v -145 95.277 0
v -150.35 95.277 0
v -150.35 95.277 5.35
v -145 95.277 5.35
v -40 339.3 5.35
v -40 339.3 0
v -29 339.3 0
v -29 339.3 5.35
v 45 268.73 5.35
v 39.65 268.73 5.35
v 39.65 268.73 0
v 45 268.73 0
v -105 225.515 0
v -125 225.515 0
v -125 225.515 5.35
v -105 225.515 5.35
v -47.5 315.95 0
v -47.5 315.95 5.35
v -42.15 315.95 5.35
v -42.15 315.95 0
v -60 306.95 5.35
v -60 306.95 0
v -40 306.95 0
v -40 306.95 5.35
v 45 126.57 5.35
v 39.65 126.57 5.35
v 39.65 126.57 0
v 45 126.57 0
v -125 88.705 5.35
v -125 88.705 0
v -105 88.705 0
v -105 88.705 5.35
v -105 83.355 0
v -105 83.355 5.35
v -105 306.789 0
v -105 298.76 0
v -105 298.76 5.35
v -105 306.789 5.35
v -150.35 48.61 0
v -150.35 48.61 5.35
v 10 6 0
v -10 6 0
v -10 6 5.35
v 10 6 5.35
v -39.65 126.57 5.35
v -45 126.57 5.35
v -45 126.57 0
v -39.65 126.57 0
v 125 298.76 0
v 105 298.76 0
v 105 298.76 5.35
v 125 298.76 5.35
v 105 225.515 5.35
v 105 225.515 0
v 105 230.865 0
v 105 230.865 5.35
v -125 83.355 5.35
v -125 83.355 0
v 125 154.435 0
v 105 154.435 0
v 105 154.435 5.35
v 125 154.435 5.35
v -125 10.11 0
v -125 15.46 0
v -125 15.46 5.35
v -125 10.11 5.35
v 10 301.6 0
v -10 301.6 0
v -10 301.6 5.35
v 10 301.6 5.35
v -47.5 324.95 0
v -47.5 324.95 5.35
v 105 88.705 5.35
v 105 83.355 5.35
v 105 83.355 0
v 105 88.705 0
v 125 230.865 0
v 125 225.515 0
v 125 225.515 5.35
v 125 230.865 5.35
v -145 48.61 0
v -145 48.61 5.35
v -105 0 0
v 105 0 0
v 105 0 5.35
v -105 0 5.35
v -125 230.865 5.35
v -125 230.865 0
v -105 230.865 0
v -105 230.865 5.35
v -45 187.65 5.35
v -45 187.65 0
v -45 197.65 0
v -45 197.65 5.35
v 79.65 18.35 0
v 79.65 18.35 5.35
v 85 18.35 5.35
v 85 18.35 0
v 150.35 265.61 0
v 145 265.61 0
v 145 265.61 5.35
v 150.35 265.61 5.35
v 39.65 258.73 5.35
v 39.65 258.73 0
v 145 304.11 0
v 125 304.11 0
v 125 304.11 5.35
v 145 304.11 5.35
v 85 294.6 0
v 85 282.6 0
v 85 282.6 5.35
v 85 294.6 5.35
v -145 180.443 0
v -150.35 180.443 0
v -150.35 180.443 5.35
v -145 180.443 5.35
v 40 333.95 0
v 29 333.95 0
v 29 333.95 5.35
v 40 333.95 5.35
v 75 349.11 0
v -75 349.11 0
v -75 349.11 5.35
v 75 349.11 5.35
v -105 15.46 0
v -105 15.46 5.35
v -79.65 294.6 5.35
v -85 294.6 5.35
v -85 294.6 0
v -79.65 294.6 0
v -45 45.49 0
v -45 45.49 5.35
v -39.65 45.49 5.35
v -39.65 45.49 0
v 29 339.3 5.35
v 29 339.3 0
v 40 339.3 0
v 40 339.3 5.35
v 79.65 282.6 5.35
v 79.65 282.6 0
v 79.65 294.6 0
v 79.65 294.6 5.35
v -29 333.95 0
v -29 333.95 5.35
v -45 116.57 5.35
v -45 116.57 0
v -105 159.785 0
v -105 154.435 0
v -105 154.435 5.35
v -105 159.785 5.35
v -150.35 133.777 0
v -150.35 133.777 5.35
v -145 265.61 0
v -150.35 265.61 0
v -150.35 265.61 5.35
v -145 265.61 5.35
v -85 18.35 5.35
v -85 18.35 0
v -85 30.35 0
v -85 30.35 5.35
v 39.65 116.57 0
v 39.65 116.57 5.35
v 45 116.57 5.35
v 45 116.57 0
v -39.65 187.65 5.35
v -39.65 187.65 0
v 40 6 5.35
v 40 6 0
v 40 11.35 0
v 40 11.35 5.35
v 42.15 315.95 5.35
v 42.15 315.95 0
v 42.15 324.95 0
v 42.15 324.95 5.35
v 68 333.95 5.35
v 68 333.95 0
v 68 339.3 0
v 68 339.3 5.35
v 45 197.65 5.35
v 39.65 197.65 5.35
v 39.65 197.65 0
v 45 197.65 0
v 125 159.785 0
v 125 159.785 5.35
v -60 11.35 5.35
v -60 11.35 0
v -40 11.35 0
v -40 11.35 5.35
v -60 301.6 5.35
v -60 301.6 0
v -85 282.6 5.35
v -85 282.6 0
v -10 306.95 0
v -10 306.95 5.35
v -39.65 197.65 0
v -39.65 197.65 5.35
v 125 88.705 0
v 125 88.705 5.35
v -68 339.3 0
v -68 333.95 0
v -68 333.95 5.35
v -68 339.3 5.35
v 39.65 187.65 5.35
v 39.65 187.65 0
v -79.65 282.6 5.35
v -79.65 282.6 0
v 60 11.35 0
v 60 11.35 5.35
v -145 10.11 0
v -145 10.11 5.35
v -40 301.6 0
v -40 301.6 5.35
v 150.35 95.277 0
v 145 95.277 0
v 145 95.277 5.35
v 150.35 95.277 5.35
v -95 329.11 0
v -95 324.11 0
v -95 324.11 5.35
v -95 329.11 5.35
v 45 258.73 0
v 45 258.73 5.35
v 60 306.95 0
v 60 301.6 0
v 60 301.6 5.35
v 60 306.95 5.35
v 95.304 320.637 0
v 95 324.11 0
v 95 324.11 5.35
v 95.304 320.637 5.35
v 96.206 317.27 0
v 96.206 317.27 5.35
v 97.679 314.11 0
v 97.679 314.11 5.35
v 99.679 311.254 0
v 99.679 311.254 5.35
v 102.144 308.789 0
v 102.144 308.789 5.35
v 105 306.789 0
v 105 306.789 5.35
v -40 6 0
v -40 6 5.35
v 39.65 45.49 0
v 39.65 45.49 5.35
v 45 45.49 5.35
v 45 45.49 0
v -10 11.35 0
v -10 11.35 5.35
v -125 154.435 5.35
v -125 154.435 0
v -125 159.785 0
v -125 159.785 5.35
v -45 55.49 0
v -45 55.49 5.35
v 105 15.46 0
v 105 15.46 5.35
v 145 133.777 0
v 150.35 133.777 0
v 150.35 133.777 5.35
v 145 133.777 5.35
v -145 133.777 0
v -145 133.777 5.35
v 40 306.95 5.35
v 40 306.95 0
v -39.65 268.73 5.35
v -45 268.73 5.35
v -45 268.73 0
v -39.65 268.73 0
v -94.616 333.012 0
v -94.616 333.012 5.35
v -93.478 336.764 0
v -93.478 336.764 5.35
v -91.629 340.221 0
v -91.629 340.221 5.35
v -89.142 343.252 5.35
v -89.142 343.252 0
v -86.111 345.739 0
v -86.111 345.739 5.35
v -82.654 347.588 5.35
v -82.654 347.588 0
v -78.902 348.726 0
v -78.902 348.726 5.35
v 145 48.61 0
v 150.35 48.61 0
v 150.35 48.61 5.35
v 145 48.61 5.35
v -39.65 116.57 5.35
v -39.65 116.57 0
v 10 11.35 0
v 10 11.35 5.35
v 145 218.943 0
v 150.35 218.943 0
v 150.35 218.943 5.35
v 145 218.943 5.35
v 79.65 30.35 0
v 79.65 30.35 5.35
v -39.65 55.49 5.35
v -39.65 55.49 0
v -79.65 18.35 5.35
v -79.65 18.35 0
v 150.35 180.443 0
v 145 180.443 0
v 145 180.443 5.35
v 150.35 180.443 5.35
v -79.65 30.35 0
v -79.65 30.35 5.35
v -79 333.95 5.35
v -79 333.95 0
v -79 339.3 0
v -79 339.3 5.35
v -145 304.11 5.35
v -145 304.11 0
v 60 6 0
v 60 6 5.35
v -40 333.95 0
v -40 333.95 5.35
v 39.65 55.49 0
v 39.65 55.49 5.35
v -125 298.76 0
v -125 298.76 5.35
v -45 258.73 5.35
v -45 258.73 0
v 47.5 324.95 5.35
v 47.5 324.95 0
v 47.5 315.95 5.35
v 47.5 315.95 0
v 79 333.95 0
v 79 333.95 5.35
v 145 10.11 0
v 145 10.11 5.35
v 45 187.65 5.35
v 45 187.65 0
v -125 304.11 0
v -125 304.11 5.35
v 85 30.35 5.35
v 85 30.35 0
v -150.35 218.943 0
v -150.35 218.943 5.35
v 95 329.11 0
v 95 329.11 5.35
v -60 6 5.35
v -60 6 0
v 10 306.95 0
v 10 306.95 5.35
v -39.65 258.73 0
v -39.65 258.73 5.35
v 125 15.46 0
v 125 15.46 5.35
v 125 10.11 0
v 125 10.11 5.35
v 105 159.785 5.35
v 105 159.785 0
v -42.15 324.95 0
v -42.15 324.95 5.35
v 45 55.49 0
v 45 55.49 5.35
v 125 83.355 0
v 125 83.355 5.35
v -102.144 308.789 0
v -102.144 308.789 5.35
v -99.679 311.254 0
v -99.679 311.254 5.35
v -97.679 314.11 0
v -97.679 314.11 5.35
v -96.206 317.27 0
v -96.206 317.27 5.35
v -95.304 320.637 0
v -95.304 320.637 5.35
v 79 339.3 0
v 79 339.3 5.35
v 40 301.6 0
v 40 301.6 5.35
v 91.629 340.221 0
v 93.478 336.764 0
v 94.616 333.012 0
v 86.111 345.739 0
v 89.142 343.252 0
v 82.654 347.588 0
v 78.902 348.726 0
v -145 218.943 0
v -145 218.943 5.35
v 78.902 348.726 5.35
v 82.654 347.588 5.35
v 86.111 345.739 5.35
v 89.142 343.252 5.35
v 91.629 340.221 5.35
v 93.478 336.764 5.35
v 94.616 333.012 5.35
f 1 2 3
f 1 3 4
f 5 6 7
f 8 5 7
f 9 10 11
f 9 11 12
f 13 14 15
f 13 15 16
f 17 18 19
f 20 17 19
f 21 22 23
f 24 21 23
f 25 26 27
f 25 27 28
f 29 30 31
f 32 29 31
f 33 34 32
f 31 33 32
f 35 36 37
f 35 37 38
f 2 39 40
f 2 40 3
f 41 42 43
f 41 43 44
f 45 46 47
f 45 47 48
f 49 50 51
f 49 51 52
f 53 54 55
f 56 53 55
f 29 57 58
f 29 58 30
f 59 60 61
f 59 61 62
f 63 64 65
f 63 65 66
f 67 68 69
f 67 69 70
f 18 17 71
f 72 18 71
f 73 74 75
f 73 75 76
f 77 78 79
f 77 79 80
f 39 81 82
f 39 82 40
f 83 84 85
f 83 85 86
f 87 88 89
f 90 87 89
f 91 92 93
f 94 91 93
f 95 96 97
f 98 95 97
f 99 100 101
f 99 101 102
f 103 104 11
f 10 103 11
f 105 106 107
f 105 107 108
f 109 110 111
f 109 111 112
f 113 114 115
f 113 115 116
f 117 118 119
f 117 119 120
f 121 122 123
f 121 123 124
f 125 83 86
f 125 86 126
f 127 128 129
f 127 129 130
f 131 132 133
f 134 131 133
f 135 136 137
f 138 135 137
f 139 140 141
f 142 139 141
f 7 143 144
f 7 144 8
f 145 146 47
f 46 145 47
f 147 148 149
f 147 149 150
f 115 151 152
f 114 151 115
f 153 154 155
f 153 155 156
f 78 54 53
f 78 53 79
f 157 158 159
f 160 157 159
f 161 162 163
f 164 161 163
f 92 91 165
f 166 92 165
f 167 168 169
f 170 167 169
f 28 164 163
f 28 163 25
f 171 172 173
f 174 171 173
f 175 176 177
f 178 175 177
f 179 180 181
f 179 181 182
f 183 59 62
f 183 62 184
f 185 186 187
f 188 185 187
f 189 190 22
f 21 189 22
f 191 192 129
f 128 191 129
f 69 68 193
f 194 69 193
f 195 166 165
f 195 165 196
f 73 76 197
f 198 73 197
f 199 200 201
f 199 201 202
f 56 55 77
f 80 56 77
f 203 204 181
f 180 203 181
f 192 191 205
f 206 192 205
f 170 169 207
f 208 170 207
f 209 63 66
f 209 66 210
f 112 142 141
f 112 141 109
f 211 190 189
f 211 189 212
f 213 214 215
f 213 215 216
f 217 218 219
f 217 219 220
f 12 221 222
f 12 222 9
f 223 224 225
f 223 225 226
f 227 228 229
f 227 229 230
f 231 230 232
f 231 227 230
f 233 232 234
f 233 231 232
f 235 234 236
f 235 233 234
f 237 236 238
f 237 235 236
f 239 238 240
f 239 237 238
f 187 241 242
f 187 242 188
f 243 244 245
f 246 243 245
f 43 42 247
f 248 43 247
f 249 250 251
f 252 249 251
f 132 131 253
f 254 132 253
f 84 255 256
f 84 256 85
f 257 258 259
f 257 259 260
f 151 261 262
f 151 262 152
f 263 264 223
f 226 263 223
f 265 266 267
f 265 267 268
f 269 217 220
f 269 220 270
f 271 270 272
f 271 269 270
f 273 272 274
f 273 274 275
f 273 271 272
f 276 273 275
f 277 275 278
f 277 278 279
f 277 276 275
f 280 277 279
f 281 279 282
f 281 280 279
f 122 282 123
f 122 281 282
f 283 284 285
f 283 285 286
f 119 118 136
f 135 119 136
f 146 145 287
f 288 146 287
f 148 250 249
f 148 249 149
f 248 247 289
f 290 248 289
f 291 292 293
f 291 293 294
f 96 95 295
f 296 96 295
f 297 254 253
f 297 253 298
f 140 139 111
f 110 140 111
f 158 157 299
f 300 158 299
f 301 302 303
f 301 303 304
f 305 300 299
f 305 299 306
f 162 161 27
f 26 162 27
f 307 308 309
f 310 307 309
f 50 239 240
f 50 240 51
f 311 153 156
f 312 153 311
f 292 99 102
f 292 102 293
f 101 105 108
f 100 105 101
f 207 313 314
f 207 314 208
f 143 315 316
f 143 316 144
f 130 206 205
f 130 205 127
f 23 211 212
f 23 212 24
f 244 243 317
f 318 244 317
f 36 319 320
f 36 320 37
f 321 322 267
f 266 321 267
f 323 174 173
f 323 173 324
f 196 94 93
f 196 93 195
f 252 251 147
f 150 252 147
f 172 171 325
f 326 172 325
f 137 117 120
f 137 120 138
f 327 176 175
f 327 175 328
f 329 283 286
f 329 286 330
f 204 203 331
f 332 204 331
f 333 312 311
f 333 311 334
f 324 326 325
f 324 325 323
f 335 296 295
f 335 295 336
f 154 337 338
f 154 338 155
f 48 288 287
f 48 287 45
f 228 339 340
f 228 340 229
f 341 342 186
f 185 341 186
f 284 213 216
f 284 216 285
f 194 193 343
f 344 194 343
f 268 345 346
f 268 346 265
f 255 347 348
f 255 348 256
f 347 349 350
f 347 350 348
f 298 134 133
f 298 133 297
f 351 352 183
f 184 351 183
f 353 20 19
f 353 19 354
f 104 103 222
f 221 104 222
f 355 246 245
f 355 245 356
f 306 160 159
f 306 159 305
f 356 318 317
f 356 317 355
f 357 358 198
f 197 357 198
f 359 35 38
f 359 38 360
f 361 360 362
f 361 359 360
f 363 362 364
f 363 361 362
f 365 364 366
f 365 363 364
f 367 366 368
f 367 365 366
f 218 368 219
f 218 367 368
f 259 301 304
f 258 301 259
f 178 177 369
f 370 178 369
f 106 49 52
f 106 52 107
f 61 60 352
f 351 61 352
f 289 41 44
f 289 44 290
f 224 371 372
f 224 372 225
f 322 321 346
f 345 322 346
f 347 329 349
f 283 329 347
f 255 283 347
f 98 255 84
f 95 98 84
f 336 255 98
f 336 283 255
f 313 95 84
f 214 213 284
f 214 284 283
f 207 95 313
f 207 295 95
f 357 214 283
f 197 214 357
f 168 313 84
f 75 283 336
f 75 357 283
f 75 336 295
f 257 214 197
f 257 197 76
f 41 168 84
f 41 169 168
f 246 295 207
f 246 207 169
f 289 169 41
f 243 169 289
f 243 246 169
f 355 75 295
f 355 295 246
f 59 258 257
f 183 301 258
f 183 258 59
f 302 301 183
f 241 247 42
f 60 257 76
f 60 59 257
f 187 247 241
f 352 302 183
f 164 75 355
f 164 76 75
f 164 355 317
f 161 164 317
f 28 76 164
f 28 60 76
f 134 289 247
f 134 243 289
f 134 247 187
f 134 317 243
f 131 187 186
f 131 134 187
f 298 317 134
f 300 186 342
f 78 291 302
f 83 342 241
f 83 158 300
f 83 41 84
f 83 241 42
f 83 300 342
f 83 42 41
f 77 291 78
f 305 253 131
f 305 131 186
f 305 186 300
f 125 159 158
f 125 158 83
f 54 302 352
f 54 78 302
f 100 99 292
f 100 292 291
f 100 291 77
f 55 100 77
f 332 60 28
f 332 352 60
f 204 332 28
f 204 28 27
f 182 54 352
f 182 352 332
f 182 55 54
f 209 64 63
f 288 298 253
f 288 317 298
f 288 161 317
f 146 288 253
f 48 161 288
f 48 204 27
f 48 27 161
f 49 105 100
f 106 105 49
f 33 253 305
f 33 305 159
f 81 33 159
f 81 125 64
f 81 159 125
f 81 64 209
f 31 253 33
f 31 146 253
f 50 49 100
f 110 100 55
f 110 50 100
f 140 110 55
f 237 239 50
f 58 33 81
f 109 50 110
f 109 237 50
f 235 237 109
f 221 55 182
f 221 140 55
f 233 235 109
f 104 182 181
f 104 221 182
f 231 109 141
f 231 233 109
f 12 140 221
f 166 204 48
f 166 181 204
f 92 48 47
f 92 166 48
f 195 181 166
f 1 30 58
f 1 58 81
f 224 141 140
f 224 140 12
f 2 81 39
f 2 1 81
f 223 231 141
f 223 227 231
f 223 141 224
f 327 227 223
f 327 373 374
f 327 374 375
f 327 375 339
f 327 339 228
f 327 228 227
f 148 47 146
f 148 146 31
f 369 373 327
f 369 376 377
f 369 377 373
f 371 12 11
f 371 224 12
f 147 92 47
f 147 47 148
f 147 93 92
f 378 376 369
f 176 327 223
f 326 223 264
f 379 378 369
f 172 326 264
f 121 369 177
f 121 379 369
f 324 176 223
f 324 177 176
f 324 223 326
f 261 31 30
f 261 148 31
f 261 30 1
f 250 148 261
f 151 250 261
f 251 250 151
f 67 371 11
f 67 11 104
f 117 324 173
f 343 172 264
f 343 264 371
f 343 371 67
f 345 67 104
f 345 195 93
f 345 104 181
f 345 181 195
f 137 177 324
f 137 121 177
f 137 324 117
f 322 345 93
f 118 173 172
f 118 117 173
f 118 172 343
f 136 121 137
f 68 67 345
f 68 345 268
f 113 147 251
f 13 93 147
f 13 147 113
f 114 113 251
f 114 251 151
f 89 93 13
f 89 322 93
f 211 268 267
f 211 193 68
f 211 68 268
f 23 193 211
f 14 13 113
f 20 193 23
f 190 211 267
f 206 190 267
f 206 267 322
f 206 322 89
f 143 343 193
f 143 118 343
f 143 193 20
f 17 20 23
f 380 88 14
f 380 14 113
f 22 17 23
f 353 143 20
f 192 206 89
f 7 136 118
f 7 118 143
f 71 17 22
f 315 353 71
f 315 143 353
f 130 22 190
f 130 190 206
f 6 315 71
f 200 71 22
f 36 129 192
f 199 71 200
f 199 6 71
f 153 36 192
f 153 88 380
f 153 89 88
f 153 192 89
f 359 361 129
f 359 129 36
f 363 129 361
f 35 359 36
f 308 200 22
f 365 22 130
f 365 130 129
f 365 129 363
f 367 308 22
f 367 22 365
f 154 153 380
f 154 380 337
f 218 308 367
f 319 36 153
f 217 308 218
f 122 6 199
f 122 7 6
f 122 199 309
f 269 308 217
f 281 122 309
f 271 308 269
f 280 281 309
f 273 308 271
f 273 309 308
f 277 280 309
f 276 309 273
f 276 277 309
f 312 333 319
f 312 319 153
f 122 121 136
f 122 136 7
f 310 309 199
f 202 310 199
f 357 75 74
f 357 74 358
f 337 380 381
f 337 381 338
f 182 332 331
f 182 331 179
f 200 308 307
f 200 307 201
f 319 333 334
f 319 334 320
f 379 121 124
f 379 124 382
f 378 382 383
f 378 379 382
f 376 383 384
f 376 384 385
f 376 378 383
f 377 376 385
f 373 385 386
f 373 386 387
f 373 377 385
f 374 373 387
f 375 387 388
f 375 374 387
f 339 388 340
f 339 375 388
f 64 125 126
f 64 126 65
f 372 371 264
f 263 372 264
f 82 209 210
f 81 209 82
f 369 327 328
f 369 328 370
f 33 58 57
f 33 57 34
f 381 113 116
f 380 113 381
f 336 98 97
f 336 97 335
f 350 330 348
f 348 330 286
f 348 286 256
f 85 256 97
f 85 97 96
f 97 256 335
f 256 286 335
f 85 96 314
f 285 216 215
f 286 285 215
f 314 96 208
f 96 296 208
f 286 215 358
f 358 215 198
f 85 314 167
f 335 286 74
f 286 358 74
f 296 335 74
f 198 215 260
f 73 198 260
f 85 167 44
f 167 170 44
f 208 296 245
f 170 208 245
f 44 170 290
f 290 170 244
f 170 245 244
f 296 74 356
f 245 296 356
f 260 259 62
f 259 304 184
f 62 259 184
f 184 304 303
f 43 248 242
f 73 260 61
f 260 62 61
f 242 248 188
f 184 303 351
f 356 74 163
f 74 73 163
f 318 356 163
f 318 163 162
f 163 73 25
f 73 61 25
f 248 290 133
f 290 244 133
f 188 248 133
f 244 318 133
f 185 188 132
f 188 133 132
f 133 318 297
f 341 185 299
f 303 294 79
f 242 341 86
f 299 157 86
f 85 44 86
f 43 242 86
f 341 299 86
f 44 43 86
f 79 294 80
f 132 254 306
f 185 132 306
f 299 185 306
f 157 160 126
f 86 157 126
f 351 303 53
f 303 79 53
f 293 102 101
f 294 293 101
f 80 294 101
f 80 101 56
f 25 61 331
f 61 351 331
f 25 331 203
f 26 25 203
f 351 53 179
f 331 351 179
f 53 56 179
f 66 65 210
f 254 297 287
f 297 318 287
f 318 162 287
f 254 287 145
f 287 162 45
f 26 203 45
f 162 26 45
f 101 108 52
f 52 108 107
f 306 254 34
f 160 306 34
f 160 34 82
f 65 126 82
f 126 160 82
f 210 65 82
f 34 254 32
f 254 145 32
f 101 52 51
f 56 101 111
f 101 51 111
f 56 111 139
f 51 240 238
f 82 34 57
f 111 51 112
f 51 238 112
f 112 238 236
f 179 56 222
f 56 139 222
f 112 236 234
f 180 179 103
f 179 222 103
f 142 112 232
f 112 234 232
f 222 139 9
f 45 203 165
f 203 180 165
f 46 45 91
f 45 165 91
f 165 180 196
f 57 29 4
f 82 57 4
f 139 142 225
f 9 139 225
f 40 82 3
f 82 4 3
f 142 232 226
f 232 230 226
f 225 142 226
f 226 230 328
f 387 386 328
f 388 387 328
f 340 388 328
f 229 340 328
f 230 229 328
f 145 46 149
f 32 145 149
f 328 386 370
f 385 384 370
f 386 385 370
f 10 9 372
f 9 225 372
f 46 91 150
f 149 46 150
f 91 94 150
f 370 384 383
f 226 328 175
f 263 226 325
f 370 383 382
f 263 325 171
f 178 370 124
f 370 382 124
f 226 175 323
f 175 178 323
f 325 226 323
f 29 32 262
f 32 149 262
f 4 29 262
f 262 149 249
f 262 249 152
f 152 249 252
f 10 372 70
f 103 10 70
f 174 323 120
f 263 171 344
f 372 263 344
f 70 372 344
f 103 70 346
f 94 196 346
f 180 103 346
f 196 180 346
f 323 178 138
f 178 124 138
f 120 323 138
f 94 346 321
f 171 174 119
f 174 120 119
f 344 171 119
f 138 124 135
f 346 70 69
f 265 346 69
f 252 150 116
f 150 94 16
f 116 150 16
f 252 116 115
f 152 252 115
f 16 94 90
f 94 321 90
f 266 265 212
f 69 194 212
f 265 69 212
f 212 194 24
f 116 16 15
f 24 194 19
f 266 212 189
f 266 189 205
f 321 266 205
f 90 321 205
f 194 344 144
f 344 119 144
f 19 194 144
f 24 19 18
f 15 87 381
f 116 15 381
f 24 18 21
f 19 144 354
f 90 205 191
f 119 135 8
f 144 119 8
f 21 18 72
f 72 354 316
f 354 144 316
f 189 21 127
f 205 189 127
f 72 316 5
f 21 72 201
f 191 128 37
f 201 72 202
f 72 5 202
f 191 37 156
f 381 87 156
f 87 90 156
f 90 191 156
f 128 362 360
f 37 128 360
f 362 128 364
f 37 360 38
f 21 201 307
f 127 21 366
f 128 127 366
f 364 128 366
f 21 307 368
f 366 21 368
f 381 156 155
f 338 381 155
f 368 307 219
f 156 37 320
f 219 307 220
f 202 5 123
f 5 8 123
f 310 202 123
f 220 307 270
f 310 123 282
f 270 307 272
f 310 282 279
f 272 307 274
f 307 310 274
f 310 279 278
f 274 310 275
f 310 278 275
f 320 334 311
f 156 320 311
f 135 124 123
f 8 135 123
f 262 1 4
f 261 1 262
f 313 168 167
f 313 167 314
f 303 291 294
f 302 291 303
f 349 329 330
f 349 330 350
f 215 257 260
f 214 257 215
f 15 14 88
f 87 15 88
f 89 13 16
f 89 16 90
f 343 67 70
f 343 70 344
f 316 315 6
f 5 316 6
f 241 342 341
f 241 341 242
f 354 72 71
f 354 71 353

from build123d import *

# Parameters (mm, degrees)
MODEL_W             = 20
MODEL_H             = 5.35
MODEL_W_2           = 5.35
MODEL_H_2           = 10
MODEL_H_3           = 12
MODEL_W_3           = 11
MODEL_H_4           = 9
BOSS_EXTRUDE1_DEPTH = 5.35


with BuildPart() as part:
    # Model → Boss-Extrude1 (new body)
    with BuildSketch(Plane.XY):
        with BuildLine():
            Line((125, 304.11), (145, 304.11))
            Line((145, 304.11), (145, 265.61))
            Line((145, 265.61), (150.35, 265.61))
            Line((150.35, 265.61), (150.35, 218.943333333))
            Line((150.35, 218.943333333), (145, 218.943333333))
            Line((145, 218.943333333), (145, 180.443333333))
            Line((145, 180.443333333), (150.35, 180.443333333))
            Line((150.35, 180.443333333), (150.35, 133.776666667))
            Line((150.35, 133.776666667), (145, 133.776666667))
            Line((145, 133.776666667), (145, 95.276666667))
            Line((145, 95.276666667), (150.35, 95.276666667))
            Line((150.35, 95.276666667), (150.35, 48.61))
            Line((150.35, 48.61), (145, 48.61))
            Line((145, 48.61), (145, 10.11))
            Line((145, 10.11), (125, 10.11))
            Line((125, 10.11), (125, 15.46))
            Line((125, 15.46), (105, 15.46))
            Line((105, 15.46), (105, 0))
            Line((105, 0), (-105, 0))
            Line((-105, 0), (-105, 15.46))
            Line((-105, 15.46), (-125, 15.46))
            Line((-125, 15.46), (-125, 10.11))
            Line((-125, 10.11), (-145, 10.11))
            Line((-145, 10.11), (-145, 48.61))
            Line((-145, 48.61), (-150.35, 48.61))
            Line((-150.35, 48.61), (-150.35, 95.276666667))
            Line((-150.35, 95.276666667), (-145, 95.276666667))
            Line((-145, 95.276666667), (-145, 133.776666667))
            Line((-145, 133.776666667), (-150.35, 133.776666667))
            Line((-150.35, 133.776666667), (-150.35, 180.443333333))
            Line((-150.35, 180.443333333), (-145, 180.443333333))
            Line((-145, 180.443333333), (-145, 218.943333333))
            Line((-145, 218.943333333), (-150.35, 218.943333333))
            Line((-150.35, 218.943333333), (-150.35, 265.61))
            Line((-150.35, 265.61), (-145, 265.61))
            Line((-145, 265.61), (-145, 304.11))
            Line((-145, 304.11), (-125, 304.11))
            Line((-125, 304.11), (-125, 298.76))
            Line((-125, 298.76), (-105, 298.76))
            Line((-105, 298.76), (-105, 306.789491924))
            ThreePointArc((-105, 306.789491924), (-97.679491924, 314.11), (-95, 324.11))
            Line((-95, 324.11), (-95, 329.11))
            ThreePointArc((-95, 329.11), (-89.142135624, 343.252135624), (-75, 349.11))
            Line((-75, 349.11), (75, 349.11))
            ThreePointArc((75, 349.11), (89.142135624, 343.252135624), (95, 329.11))
            Line((95, 329.11), (95, 324.11))
            ThreePointArc((95, 324.11), (97.679491924, 314.11), (105, 306.789491924))
            Line((105, 306.789491924), (105, 298.76))
            Line((105, 298.76), (125, 298.76))
            Line((125, 298.76), (125, 304.11))
        make_face()
        with Locations((-115, 157.11)):
            Rectangle(MODEL_W, MODEL_H, mode=Mode.SUBTRACT)
        with Locations((-115, 228.19)):
            Rectangle(MODEL_W, MODEL_H, mode=Mode.SUBTRACT)
        with Locations((-115, 86.03)):
            Rectangle(MODEL_W, MODEL_H, mode=Mode.SUBTRACT)
        with Locations((-42.325, 192.65)):
            Rectangle(MODEL_W_2, MODEL_H_2, mode=Mode.SUBTRACT)
        with Locations((-42.325, 263.73)):
            Rectangle(MODEL_W_2, MODEL_H_2, mode=Mode.SUBTRACT)
        with Locations((-42.325, 121.57)):
            Rectangle(MODEL_W_2, MODEL_H_2, mode=Mode.SUBTRACT)
        with Locations((-42.325, 50.49)):
            Rectangle(MODEL_W_2, MODEL_H_2, mode=Mode.SUBTRACT)
        with Locations((-50, 304.275)):
            Rectangle(MODEL_W, MODEL_H, mode=Mode.SUBTRACT)
        with Locations((0, 8.675)):
            Rectangle(MODEL_W, MODEL_H, mode=Mode.SUBTRACT)
        with Locations((-82.325, 288.6)):
            Rectangle(MODEL_W_2, MODEL_H_3, mode=Mode.SUBTRACT)
        with Locations((-50, 8.675)):
            Rectangle(MODEL_W, MODEL_H, mode=Mode.SUBTRACT)
        with Locations((-82.325, 24.35)):
            Rectangle(MODEL_W_2, MODEL_H_3, mode=Mode.SUBTRACT)
        with Locations((0, 304.275)):
            Rectangle(MODEL_W, MODEL_H, mode=Mode.SUBTRACT)
        with Locations((-73.5, 336.625)):
            Rectangle(MODEL_W_3, MODEL_H, mode=Mode.SUBTRACT)
        with Locations((-44.825, 320.45)):
            Rectangle(MODEL_W_2, MODEL_H_4, mode=Mode.SUBTRACT)
        with Locations((-34.5, 336.625)):
            Rectangle(MODEL_W_3, MODEL_H, mode=Mode.SUBTRACT)
        with Locations((50, 304.275)):
            Rectangle(MODEL_W, MODEL_H, mode=Mode.SUBTRACT)
        with Locations((44.825, 320.45)):
            Rectangle(MODEL_W_2, MODEL_H_4, mode=Mode.SUBTRACT)
        with Locations((34.5, 336.625)):
            Rectangle(MODEL_W_3, MODEL_H, mode=Mode.SUBTRACT)
        with Locations((73.5, 336.625)):
            Rectangle(MODEL_W_3, MODEL_H, mode=Mode.SUBTRACT)
        with Locations((115, 86.03)):
            Rectangle(MODEL_W, MODEL_H, mode=Mode.SUBTRACT)
        with Locations((115, 157.11)):
            Rectangle(MODEL_W, MODEL_H, mode=Mode.SUBTRACT)
        with Locations((115, 228.19)):
            Rectangle(MODEL_W, MODEL_H, mode=Mode.SUBTRACT)
        with Locations((82.325, 288.6)):
            Rectangle(MODEL_W_2, MODEL_H_3, mode=Mode.SUBTRACT)
        with Locations((42.325, 263.73)):
            Rectangle(MODEL_W_2, MODEL_H_2, mode=Mode.SUBTRACT)
        with Locations((42.325, 192.65)):
            Rectangle(MODEL_W_2, MODEL_H_2, mode=Mode.SUBTRACT)
        with Locations((42.325, 121.57)):
            Rectangle(MODEL_W_2, MODEL_H_2, mode=Mode.SUBTRACT)
        with Locations((42.325, 50.49)):
            Rectangle(MODEL_W_2, MODEL_H_2, mode=Mode.SUBTRACT)
        with Locations((82.325, 24.35)):
            Rectangle(MODEL_W_2, MODEL_H_3, mode=Mode.SUBTRACT)
        with Locations((50, 8.675)):
            Rectangle(MODEL_W, MODEL_H, mode=Mode.SUBTRACT)
    extrude(amount=BOSS_EXTRUDE1_DEPTH)


solid = part.part
